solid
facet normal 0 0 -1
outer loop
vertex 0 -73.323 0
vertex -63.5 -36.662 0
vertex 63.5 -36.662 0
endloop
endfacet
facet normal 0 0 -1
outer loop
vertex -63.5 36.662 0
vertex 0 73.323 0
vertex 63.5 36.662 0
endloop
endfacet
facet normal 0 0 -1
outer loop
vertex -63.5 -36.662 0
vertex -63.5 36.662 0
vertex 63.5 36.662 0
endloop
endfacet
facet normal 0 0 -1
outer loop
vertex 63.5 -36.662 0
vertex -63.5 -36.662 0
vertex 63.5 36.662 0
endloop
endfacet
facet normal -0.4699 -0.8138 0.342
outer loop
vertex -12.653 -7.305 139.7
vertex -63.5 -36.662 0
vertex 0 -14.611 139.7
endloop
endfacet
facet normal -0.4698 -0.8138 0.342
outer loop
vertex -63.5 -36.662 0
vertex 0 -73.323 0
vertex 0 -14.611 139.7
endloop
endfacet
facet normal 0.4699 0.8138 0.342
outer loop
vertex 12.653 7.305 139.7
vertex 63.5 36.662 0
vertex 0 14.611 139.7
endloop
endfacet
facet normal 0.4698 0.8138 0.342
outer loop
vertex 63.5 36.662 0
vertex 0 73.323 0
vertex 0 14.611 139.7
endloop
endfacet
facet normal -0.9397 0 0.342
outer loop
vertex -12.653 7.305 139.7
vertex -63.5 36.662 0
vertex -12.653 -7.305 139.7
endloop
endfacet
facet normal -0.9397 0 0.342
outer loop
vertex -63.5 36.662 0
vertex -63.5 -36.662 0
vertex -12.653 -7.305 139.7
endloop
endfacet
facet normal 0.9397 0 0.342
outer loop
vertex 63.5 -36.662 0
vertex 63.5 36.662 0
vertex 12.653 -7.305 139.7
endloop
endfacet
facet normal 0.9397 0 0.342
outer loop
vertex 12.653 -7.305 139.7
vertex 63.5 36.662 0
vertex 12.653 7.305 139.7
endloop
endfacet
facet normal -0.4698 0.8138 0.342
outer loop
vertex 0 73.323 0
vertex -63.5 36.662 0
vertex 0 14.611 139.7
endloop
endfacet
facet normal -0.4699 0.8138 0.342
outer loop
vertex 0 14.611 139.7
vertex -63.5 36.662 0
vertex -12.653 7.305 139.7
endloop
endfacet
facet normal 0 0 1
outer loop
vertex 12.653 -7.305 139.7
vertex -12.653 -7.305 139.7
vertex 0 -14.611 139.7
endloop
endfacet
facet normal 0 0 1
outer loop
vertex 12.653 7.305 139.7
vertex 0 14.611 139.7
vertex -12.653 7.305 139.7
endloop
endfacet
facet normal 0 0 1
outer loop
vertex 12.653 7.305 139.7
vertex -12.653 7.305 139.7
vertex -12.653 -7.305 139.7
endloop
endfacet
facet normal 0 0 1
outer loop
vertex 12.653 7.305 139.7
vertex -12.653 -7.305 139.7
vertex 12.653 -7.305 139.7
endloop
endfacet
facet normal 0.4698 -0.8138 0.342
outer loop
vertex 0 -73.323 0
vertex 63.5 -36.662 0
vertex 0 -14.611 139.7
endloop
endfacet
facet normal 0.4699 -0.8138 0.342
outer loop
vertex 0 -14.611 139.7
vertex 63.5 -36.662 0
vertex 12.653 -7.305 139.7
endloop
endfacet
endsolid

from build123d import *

# Parameters (mm, degrees)
F1_DEPTH = 139.7
F1_TAPER = 20


with BuildPart() as f1:
    # F0 (on Top) → F1 (new body)
    with BuildSketch(Plane.XY):
        Polygon((63.5, -36.6617420935), (63.5, 36.6617420935), (0, 73.3234841871), (-63.5, 36.6617420935), (-63.5, -36.6617420935), (0, -73.3234841871), align=None)
    extrude(amount=F1_DEPTH, taper=F1_TAPER)


solid = f1.part
